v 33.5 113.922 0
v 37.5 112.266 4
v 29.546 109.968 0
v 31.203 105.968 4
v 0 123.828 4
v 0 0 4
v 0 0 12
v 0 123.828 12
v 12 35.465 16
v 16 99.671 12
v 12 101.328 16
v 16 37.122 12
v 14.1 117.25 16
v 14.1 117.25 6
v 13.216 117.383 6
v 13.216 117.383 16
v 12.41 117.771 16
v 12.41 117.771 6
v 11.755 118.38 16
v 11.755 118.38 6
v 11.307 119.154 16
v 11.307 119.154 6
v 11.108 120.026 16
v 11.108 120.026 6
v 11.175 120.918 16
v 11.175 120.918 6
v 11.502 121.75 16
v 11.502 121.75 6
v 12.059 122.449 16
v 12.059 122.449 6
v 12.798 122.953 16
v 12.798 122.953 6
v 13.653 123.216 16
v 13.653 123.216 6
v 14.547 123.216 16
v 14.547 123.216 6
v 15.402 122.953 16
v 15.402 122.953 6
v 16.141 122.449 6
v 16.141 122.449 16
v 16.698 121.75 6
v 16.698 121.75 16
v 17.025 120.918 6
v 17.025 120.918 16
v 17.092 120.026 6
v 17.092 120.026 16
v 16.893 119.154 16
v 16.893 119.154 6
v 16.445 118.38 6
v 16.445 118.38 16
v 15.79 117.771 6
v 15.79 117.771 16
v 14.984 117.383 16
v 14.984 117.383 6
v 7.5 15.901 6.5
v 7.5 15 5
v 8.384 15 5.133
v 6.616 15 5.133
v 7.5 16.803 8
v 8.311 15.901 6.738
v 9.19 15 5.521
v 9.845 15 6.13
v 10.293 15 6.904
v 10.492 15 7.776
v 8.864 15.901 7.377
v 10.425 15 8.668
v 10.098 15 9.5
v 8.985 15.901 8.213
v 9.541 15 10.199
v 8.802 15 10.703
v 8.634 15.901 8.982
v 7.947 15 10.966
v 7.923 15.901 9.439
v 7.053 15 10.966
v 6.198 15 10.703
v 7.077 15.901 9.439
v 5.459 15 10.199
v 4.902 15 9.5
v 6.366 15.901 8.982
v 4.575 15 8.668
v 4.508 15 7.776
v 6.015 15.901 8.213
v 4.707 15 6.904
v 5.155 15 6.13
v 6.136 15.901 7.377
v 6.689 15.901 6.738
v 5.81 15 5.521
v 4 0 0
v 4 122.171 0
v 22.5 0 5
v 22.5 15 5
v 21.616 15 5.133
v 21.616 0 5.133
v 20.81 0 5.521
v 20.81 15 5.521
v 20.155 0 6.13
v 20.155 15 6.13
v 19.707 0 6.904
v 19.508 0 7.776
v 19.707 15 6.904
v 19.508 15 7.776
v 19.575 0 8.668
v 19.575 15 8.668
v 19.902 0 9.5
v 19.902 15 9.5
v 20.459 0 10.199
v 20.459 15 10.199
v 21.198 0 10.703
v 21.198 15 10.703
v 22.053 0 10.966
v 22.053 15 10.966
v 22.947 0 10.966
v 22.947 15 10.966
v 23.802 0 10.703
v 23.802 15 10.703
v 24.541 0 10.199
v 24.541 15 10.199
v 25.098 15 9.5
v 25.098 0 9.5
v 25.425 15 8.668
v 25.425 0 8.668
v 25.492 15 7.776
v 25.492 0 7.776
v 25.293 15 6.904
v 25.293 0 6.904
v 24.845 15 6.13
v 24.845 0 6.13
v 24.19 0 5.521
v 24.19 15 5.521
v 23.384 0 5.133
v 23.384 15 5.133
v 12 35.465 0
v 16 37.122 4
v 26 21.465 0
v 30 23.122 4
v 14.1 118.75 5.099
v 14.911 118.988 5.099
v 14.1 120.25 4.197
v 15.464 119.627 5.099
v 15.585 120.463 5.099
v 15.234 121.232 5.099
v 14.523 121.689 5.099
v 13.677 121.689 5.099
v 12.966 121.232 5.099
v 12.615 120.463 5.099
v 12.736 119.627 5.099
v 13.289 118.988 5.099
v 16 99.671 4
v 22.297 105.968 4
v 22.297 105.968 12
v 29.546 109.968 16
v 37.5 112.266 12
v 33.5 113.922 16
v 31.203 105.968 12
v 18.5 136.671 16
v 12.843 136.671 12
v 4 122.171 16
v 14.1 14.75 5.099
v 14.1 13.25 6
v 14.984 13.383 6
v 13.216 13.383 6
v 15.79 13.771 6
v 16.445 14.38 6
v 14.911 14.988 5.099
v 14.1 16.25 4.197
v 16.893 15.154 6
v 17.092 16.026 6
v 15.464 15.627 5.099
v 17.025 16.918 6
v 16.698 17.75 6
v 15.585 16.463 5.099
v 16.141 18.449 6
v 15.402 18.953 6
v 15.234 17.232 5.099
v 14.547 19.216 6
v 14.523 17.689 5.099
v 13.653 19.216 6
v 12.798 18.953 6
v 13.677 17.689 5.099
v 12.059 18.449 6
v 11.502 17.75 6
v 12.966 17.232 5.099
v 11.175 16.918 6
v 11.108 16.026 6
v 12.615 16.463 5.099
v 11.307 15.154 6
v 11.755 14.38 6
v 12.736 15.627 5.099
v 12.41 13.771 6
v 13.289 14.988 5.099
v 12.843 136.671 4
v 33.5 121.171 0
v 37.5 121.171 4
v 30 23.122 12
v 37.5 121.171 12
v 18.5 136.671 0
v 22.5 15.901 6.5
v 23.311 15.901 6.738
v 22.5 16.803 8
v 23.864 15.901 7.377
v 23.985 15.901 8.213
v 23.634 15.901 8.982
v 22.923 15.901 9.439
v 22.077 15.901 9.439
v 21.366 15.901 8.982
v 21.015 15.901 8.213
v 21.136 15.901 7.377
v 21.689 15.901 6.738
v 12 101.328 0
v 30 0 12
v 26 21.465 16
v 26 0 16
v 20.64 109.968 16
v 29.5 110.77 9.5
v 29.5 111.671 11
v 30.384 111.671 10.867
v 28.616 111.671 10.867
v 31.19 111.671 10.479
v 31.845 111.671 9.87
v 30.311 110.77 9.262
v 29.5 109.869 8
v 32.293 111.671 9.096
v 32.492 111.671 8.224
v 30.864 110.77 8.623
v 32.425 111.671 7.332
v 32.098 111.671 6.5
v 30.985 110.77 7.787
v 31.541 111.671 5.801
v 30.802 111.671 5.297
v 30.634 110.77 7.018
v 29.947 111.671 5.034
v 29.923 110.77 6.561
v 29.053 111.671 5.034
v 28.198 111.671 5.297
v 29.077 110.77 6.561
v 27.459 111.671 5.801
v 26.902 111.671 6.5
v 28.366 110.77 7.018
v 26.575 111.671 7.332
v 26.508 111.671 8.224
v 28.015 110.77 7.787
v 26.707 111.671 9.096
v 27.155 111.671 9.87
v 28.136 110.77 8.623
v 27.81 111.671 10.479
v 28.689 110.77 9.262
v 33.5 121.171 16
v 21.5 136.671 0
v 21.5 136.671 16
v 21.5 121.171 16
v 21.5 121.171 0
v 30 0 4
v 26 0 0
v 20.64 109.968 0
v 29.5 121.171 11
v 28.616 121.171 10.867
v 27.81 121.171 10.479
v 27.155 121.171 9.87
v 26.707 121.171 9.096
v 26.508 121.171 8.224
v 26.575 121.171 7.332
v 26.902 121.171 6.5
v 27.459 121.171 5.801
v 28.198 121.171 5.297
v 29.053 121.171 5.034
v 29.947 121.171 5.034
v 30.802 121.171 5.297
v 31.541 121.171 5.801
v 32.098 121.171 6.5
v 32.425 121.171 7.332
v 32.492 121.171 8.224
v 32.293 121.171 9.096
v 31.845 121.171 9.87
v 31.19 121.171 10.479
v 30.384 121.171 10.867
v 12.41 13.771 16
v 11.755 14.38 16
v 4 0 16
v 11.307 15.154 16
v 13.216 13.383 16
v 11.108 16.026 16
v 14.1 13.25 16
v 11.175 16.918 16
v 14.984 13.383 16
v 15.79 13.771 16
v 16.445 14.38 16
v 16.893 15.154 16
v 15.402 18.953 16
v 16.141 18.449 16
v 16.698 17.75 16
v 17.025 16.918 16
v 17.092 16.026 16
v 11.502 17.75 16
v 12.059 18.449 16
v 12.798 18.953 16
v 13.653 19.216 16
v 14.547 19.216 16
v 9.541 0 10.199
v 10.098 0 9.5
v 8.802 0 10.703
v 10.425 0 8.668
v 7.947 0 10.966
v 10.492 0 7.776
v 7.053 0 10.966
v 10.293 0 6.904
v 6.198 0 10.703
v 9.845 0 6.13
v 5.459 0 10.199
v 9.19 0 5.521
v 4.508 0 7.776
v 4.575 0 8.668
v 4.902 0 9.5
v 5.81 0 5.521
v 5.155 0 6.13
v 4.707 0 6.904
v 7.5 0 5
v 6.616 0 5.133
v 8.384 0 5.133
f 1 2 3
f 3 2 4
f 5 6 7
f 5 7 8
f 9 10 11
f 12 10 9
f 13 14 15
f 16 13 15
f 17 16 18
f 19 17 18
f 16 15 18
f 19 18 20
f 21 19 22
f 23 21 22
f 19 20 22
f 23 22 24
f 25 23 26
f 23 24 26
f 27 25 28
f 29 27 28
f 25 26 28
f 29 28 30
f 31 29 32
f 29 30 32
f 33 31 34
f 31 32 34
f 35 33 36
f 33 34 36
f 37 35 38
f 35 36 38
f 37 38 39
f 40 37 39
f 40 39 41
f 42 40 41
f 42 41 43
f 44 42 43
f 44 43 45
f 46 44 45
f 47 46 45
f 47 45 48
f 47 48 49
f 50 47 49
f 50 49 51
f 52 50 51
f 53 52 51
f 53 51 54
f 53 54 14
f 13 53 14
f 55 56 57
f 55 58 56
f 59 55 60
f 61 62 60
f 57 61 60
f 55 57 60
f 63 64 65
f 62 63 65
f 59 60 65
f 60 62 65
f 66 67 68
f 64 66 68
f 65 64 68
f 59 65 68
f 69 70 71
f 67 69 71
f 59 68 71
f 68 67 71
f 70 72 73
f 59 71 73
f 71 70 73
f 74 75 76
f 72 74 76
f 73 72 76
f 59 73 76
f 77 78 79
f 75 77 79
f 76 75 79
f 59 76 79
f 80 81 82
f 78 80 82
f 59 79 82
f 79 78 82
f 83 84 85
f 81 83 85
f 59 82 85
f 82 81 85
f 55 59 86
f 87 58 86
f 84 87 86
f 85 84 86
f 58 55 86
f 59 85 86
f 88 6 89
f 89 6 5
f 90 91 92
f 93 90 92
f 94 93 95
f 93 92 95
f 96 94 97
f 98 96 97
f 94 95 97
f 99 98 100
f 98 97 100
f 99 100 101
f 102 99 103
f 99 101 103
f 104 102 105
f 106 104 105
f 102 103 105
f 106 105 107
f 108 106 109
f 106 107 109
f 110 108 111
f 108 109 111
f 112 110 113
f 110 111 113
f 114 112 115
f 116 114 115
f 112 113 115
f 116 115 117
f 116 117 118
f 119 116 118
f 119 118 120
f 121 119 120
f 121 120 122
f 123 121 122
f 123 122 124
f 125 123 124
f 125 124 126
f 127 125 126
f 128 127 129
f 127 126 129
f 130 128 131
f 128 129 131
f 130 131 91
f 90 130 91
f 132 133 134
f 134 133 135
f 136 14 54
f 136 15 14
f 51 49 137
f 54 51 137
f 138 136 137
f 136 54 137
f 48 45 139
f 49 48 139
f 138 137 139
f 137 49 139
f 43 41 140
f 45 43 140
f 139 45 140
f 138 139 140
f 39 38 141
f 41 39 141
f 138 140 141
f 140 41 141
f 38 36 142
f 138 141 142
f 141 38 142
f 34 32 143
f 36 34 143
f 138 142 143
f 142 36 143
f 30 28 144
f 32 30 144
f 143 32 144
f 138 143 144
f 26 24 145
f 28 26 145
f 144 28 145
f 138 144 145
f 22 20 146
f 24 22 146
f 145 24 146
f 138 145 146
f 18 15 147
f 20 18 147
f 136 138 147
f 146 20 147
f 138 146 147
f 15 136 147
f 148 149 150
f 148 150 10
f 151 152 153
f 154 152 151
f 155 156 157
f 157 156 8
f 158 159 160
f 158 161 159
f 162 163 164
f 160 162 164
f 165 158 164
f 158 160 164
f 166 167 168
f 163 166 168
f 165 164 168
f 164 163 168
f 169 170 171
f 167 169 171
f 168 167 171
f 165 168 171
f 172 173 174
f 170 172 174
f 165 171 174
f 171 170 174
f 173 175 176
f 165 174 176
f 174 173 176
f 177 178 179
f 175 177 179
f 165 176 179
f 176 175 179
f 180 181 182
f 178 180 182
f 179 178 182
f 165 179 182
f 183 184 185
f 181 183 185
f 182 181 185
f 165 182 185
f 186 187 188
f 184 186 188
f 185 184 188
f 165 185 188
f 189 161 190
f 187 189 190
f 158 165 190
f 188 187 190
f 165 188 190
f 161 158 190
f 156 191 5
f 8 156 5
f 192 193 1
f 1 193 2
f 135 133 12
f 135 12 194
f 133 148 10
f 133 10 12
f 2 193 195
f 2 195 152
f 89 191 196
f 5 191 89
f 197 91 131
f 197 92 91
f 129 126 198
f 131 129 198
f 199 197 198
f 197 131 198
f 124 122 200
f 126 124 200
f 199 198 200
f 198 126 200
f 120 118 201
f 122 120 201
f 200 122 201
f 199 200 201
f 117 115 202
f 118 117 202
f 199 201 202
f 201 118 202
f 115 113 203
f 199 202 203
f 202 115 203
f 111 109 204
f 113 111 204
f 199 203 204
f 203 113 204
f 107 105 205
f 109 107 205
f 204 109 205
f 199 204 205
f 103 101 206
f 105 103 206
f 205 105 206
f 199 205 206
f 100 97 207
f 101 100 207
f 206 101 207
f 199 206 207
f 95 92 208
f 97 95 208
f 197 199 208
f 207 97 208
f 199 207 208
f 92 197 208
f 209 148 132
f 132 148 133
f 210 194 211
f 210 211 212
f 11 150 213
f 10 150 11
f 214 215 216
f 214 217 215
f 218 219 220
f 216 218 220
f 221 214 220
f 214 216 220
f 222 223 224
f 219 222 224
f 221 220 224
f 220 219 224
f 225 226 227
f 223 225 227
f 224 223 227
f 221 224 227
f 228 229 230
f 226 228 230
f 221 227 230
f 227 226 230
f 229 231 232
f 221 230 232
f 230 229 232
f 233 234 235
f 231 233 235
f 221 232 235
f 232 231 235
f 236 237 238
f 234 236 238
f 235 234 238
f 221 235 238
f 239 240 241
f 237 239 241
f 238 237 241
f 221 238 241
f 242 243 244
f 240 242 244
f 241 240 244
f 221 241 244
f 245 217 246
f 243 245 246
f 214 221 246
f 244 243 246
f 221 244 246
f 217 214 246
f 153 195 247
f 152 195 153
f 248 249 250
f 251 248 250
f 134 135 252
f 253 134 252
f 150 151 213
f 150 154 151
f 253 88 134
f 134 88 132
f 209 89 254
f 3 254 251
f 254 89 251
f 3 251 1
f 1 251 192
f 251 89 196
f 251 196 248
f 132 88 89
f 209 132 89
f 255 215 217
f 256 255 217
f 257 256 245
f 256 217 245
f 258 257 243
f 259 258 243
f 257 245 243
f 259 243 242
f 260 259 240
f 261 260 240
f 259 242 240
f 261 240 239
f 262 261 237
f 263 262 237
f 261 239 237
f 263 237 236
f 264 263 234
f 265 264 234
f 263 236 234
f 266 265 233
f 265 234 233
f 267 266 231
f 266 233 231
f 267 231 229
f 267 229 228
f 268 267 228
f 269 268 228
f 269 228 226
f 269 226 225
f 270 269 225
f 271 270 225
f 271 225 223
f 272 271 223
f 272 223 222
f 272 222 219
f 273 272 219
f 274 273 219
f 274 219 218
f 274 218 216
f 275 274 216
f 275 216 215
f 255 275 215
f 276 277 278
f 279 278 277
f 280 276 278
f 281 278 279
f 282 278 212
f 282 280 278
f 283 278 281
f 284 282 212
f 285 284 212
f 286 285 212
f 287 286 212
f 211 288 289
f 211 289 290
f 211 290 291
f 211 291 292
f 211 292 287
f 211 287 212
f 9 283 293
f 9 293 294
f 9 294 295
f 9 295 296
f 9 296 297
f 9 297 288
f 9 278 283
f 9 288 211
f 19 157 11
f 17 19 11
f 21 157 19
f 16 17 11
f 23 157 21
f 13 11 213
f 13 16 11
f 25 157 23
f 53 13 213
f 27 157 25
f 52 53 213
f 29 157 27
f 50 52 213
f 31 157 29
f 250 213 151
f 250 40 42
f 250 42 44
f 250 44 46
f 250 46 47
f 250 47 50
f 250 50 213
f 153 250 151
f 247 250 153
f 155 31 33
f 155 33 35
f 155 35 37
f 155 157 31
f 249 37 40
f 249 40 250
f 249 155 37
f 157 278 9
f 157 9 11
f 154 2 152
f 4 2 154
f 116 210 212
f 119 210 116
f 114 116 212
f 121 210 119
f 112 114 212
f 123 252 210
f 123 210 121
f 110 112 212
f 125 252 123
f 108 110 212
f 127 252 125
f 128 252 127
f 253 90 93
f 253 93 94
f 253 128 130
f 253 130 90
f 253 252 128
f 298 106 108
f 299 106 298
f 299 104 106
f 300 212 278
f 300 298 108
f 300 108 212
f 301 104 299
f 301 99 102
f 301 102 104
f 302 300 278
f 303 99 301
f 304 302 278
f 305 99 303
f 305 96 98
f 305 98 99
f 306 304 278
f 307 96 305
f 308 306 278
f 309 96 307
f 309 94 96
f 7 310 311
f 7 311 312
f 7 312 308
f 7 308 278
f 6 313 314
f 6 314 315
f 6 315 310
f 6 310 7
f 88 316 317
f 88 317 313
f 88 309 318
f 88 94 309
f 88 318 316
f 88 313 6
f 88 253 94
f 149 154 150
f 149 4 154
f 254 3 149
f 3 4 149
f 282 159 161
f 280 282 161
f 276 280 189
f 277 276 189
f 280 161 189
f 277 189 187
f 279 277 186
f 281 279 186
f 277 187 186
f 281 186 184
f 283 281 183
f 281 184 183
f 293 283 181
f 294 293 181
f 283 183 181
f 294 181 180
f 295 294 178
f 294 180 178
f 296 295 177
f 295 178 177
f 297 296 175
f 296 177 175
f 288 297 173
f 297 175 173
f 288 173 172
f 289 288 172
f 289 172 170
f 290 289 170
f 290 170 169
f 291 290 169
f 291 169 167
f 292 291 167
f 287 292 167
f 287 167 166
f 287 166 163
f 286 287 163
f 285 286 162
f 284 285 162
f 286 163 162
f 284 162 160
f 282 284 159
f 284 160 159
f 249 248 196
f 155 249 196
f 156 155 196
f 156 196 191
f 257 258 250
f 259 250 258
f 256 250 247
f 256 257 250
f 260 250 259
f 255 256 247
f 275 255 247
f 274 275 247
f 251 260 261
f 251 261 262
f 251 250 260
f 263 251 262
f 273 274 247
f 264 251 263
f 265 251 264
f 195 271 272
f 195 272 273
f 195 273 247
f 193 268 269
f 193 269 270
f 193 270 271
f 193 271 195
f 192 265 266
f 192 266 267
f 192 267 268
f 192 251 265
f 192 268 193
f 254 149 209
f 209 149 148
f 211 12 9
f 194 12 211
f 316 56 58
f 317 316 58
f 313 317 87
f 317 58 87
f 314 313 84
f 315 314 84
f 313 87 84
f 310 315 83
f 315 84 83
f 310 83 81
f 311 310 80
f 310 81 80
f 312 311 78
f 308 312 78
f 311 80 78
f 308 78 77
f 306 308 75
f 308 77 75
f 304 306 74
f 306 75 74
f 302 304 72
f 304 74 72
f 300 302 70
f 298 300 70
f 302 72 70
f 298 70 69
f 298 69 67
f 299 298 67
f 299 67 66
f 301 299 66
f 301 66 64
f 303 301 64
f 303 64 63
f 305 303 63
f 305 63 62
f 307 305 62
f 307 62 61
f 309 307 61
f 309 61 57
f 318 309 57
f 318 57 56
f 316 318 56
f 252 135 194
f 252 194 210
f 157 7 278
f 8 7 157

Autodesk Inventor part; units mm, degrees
ref_plane "YZ Plane" through (0, 0, 0) normal (1, 0, 0) x (0, 1, 0)
sketch "Sketch1" plane through (0, 0, 0) normal (0, 0, 1) x (1, 0, 0)
  line L0 (37.5, 112.2656) -> (37.5, -3.3598) construction
  line L1 (37.5, 136.6711) -> (12.8431, 136.6711)
  line L2 (12.8431, 136.6711) -> (3.4308, 127.2588)
  line L3 (21.5, 136.6711) -> (21.5, 121.1711)
  line L4 (21.5, 121.1711) -> (37.5, 121.1711)
  line L5 (7.5005, 125.6717) -> (18.5, 136.6711) construction
  circle A0 centre (74.25, 61.25) radius 56.25 construction
  line L6 (37.5, 121.1711) -> (111, 121.1711) construction
  line L7 (111, 121.1711) -> (111, 150.3493) construction
  line L8 (111, 150.3493) -> (37.5, 150.3493) construction
  line L9 (37.5, 150.3493) -> (37.5, 121.1711) construction
  line L10 (37.5, 112.2656) -> (31.2028, 105.9683)
  line L11 (31.2028, 105.9683) -> (22.2972, 105.9683)
  line L12 (22.2972, 105.9683) -> (16, 99.6711)
  line L13 (16, 99.6711) -> (16, 37.1221)
  line L14 (16, 37.1221) -> (30, 23.1221)
  line L15 (30, 23.1221) -> (30, 0)
  line L16 (30, 0) -> (0, 0)
  line L17 (0, 0) -> (0, 123.828)
  line L18 (3.4308, 127.2588) -> (0, 123.828)
  line L19 (18, 73.8677) -> (18, 48.6323) construction
  line L20 (83.3625, 5) -> (65.1375, 5) construction
  line L21 (37.5, 121.1711) -> (37.5, 136.6711)
  line L22 (37.5, 121.1711) -> (37.5, 112.2656)
  line L23 (35.2471, 20.7034) -> (29.4259, 26.5246) construction
  point P0 (19.5296, 140.85)
  point P1 (74.25, 121.1711)
  point P2 (18, 61.25)
  point P3 (74.25, 5)
  dimension "d32" = 15.5
  dimension "d33" = 16
  dimension "d34" = 8.6569
  dimension "d38" = 4
  dimension "d39" = 3
  dimension "d65" = 112.5
  dimension "d66" = 70.293
  dimension "d67" = 73.5
  dimension "d70" = 45
  dimension "d71" = 16
  dimension "d72" = 2
  dimension "d73" = 5
  dimension "d74" = 30
  dimension "d75" = 2
extrude "Extrusion2" add sketch "Sketch1" along normal blind 16 contours L3 L4 L22 L10 L11 L12 L13 L14 L15 L16 L17 L18 L2 L1
ref_plane "Work Plane3" through (21.5, 121.1711, 16) normal (0, 1, 0) x (1, 0, 0)
sketch "Sketch4" plane through (21.5, 121.1711, 16) normal (0, 1, 0) x (1, 0, 0)
  circle A0 centre (8, 8) radius 3
  line L0 (16, 16) -> (0, 16) projected
  line L1 (16, 16) -> (16, 0) projected
  point P0 (-21.5, 16)
  point P1 (16, 8)
  point P2 (8, 16)
  dimension "d76" = 6
hole "Hole1" at (29.5, 121.1711, 8) direction (0, -1, 0) diameter 6 depth 9.5 tip angle 118
ref_plane "Work Plane2" through (4, 0, 0) normal (0, -1, 0) x (1, 0, 0)
sketch "Sketch5" plane through (4, 0, 0) normal (0, -1, 0) x (1, 0, 0)
  circle A0 centre (3.5, 8) radius 3
  line L0 (11, 48.9313) -> (11, 41.3239)
  circle A1 centre (18.5, 8) radius 3
  line L1 (-4, 0) -> (26, 0) projected
  line L2 (26, 0) -> (26, 16) projected
  point P0 (11, 0)
  point P1 (26, 8)
  dimension "d52" = 6
  dimension "d77" = 15
hole "Hole2" at (7.5, 0, 8) at (22.5, 0, 8) direction (0, 1, 0) diameter 6 depth 15 tip angle 118
thread "Thread4" size "M6x1" class "6H" standard "ANSI Metric M Profile" full length
thread "Thread5" size "M6x1" class "6H" standard "ANSI Metric M Profile" full length
chamfer "Chamfer2" distance 4 angle 45 18 edges at (0, 61.914, 16) (6.4216, 130.2496, 16) (6.4216, 130.2496, 0) (0, 61.914, 0) (34.3514, 109.1169, 0) (26.75, 105.9683, 0) (19.1486, 102.8197, 0) (16, 68.3966, 0) (23, 30.1221, 0) (30, 11.561, 0) (34.3514, 109.1169, 16) (26.75, 105.9683, 16) (19.1486, 102.8197, 16) (16, 68.3966, 16) (23, 30.1221, 16) (30, 11.561, 16) (37.5, 116.7183, 16) (37.5, 116.7183, 0)
sketch "Sketch6" plane through (0, 0, 16) normal (0, 0, 1) x (1, 0, 0)
  circle A0 centre (14.1, 120.25) radius 3
  circle A1 centre (14.1, 16.25) radius 3
  line L0 (4, 0) -> (4, 122.1711) projected
  circle A2 centre (74.25, 61.25) radius 56.25 construction
  circle A3 centre (74.25, 61.25) radius 50 construction
  line L1 (74.25, 111.25) -> (10.3895, 111.25) construction
  line L2 (0, 0) -> (4, 0) projected
  dimension "d88" = 100
  dimension "d85" = 6
  dimension "d86" = 10.1
  dimension "d89" = 9
  dimension "d103" = 104
hole "Hole3" at (14.1, 120.25, 16) at (14.1, 16.25, 16) direction (0, 0, -1) diameter 6 depth 10 tip angle 118
thread "Thread8" size "M6x1" class "6H" standard "ANSI Metric M Profile" full length
thread "Thread9" size "M6x1" class "6H" standard "ANSI Metric M Profile" full length
properties part number "rackstand-v2-left"
